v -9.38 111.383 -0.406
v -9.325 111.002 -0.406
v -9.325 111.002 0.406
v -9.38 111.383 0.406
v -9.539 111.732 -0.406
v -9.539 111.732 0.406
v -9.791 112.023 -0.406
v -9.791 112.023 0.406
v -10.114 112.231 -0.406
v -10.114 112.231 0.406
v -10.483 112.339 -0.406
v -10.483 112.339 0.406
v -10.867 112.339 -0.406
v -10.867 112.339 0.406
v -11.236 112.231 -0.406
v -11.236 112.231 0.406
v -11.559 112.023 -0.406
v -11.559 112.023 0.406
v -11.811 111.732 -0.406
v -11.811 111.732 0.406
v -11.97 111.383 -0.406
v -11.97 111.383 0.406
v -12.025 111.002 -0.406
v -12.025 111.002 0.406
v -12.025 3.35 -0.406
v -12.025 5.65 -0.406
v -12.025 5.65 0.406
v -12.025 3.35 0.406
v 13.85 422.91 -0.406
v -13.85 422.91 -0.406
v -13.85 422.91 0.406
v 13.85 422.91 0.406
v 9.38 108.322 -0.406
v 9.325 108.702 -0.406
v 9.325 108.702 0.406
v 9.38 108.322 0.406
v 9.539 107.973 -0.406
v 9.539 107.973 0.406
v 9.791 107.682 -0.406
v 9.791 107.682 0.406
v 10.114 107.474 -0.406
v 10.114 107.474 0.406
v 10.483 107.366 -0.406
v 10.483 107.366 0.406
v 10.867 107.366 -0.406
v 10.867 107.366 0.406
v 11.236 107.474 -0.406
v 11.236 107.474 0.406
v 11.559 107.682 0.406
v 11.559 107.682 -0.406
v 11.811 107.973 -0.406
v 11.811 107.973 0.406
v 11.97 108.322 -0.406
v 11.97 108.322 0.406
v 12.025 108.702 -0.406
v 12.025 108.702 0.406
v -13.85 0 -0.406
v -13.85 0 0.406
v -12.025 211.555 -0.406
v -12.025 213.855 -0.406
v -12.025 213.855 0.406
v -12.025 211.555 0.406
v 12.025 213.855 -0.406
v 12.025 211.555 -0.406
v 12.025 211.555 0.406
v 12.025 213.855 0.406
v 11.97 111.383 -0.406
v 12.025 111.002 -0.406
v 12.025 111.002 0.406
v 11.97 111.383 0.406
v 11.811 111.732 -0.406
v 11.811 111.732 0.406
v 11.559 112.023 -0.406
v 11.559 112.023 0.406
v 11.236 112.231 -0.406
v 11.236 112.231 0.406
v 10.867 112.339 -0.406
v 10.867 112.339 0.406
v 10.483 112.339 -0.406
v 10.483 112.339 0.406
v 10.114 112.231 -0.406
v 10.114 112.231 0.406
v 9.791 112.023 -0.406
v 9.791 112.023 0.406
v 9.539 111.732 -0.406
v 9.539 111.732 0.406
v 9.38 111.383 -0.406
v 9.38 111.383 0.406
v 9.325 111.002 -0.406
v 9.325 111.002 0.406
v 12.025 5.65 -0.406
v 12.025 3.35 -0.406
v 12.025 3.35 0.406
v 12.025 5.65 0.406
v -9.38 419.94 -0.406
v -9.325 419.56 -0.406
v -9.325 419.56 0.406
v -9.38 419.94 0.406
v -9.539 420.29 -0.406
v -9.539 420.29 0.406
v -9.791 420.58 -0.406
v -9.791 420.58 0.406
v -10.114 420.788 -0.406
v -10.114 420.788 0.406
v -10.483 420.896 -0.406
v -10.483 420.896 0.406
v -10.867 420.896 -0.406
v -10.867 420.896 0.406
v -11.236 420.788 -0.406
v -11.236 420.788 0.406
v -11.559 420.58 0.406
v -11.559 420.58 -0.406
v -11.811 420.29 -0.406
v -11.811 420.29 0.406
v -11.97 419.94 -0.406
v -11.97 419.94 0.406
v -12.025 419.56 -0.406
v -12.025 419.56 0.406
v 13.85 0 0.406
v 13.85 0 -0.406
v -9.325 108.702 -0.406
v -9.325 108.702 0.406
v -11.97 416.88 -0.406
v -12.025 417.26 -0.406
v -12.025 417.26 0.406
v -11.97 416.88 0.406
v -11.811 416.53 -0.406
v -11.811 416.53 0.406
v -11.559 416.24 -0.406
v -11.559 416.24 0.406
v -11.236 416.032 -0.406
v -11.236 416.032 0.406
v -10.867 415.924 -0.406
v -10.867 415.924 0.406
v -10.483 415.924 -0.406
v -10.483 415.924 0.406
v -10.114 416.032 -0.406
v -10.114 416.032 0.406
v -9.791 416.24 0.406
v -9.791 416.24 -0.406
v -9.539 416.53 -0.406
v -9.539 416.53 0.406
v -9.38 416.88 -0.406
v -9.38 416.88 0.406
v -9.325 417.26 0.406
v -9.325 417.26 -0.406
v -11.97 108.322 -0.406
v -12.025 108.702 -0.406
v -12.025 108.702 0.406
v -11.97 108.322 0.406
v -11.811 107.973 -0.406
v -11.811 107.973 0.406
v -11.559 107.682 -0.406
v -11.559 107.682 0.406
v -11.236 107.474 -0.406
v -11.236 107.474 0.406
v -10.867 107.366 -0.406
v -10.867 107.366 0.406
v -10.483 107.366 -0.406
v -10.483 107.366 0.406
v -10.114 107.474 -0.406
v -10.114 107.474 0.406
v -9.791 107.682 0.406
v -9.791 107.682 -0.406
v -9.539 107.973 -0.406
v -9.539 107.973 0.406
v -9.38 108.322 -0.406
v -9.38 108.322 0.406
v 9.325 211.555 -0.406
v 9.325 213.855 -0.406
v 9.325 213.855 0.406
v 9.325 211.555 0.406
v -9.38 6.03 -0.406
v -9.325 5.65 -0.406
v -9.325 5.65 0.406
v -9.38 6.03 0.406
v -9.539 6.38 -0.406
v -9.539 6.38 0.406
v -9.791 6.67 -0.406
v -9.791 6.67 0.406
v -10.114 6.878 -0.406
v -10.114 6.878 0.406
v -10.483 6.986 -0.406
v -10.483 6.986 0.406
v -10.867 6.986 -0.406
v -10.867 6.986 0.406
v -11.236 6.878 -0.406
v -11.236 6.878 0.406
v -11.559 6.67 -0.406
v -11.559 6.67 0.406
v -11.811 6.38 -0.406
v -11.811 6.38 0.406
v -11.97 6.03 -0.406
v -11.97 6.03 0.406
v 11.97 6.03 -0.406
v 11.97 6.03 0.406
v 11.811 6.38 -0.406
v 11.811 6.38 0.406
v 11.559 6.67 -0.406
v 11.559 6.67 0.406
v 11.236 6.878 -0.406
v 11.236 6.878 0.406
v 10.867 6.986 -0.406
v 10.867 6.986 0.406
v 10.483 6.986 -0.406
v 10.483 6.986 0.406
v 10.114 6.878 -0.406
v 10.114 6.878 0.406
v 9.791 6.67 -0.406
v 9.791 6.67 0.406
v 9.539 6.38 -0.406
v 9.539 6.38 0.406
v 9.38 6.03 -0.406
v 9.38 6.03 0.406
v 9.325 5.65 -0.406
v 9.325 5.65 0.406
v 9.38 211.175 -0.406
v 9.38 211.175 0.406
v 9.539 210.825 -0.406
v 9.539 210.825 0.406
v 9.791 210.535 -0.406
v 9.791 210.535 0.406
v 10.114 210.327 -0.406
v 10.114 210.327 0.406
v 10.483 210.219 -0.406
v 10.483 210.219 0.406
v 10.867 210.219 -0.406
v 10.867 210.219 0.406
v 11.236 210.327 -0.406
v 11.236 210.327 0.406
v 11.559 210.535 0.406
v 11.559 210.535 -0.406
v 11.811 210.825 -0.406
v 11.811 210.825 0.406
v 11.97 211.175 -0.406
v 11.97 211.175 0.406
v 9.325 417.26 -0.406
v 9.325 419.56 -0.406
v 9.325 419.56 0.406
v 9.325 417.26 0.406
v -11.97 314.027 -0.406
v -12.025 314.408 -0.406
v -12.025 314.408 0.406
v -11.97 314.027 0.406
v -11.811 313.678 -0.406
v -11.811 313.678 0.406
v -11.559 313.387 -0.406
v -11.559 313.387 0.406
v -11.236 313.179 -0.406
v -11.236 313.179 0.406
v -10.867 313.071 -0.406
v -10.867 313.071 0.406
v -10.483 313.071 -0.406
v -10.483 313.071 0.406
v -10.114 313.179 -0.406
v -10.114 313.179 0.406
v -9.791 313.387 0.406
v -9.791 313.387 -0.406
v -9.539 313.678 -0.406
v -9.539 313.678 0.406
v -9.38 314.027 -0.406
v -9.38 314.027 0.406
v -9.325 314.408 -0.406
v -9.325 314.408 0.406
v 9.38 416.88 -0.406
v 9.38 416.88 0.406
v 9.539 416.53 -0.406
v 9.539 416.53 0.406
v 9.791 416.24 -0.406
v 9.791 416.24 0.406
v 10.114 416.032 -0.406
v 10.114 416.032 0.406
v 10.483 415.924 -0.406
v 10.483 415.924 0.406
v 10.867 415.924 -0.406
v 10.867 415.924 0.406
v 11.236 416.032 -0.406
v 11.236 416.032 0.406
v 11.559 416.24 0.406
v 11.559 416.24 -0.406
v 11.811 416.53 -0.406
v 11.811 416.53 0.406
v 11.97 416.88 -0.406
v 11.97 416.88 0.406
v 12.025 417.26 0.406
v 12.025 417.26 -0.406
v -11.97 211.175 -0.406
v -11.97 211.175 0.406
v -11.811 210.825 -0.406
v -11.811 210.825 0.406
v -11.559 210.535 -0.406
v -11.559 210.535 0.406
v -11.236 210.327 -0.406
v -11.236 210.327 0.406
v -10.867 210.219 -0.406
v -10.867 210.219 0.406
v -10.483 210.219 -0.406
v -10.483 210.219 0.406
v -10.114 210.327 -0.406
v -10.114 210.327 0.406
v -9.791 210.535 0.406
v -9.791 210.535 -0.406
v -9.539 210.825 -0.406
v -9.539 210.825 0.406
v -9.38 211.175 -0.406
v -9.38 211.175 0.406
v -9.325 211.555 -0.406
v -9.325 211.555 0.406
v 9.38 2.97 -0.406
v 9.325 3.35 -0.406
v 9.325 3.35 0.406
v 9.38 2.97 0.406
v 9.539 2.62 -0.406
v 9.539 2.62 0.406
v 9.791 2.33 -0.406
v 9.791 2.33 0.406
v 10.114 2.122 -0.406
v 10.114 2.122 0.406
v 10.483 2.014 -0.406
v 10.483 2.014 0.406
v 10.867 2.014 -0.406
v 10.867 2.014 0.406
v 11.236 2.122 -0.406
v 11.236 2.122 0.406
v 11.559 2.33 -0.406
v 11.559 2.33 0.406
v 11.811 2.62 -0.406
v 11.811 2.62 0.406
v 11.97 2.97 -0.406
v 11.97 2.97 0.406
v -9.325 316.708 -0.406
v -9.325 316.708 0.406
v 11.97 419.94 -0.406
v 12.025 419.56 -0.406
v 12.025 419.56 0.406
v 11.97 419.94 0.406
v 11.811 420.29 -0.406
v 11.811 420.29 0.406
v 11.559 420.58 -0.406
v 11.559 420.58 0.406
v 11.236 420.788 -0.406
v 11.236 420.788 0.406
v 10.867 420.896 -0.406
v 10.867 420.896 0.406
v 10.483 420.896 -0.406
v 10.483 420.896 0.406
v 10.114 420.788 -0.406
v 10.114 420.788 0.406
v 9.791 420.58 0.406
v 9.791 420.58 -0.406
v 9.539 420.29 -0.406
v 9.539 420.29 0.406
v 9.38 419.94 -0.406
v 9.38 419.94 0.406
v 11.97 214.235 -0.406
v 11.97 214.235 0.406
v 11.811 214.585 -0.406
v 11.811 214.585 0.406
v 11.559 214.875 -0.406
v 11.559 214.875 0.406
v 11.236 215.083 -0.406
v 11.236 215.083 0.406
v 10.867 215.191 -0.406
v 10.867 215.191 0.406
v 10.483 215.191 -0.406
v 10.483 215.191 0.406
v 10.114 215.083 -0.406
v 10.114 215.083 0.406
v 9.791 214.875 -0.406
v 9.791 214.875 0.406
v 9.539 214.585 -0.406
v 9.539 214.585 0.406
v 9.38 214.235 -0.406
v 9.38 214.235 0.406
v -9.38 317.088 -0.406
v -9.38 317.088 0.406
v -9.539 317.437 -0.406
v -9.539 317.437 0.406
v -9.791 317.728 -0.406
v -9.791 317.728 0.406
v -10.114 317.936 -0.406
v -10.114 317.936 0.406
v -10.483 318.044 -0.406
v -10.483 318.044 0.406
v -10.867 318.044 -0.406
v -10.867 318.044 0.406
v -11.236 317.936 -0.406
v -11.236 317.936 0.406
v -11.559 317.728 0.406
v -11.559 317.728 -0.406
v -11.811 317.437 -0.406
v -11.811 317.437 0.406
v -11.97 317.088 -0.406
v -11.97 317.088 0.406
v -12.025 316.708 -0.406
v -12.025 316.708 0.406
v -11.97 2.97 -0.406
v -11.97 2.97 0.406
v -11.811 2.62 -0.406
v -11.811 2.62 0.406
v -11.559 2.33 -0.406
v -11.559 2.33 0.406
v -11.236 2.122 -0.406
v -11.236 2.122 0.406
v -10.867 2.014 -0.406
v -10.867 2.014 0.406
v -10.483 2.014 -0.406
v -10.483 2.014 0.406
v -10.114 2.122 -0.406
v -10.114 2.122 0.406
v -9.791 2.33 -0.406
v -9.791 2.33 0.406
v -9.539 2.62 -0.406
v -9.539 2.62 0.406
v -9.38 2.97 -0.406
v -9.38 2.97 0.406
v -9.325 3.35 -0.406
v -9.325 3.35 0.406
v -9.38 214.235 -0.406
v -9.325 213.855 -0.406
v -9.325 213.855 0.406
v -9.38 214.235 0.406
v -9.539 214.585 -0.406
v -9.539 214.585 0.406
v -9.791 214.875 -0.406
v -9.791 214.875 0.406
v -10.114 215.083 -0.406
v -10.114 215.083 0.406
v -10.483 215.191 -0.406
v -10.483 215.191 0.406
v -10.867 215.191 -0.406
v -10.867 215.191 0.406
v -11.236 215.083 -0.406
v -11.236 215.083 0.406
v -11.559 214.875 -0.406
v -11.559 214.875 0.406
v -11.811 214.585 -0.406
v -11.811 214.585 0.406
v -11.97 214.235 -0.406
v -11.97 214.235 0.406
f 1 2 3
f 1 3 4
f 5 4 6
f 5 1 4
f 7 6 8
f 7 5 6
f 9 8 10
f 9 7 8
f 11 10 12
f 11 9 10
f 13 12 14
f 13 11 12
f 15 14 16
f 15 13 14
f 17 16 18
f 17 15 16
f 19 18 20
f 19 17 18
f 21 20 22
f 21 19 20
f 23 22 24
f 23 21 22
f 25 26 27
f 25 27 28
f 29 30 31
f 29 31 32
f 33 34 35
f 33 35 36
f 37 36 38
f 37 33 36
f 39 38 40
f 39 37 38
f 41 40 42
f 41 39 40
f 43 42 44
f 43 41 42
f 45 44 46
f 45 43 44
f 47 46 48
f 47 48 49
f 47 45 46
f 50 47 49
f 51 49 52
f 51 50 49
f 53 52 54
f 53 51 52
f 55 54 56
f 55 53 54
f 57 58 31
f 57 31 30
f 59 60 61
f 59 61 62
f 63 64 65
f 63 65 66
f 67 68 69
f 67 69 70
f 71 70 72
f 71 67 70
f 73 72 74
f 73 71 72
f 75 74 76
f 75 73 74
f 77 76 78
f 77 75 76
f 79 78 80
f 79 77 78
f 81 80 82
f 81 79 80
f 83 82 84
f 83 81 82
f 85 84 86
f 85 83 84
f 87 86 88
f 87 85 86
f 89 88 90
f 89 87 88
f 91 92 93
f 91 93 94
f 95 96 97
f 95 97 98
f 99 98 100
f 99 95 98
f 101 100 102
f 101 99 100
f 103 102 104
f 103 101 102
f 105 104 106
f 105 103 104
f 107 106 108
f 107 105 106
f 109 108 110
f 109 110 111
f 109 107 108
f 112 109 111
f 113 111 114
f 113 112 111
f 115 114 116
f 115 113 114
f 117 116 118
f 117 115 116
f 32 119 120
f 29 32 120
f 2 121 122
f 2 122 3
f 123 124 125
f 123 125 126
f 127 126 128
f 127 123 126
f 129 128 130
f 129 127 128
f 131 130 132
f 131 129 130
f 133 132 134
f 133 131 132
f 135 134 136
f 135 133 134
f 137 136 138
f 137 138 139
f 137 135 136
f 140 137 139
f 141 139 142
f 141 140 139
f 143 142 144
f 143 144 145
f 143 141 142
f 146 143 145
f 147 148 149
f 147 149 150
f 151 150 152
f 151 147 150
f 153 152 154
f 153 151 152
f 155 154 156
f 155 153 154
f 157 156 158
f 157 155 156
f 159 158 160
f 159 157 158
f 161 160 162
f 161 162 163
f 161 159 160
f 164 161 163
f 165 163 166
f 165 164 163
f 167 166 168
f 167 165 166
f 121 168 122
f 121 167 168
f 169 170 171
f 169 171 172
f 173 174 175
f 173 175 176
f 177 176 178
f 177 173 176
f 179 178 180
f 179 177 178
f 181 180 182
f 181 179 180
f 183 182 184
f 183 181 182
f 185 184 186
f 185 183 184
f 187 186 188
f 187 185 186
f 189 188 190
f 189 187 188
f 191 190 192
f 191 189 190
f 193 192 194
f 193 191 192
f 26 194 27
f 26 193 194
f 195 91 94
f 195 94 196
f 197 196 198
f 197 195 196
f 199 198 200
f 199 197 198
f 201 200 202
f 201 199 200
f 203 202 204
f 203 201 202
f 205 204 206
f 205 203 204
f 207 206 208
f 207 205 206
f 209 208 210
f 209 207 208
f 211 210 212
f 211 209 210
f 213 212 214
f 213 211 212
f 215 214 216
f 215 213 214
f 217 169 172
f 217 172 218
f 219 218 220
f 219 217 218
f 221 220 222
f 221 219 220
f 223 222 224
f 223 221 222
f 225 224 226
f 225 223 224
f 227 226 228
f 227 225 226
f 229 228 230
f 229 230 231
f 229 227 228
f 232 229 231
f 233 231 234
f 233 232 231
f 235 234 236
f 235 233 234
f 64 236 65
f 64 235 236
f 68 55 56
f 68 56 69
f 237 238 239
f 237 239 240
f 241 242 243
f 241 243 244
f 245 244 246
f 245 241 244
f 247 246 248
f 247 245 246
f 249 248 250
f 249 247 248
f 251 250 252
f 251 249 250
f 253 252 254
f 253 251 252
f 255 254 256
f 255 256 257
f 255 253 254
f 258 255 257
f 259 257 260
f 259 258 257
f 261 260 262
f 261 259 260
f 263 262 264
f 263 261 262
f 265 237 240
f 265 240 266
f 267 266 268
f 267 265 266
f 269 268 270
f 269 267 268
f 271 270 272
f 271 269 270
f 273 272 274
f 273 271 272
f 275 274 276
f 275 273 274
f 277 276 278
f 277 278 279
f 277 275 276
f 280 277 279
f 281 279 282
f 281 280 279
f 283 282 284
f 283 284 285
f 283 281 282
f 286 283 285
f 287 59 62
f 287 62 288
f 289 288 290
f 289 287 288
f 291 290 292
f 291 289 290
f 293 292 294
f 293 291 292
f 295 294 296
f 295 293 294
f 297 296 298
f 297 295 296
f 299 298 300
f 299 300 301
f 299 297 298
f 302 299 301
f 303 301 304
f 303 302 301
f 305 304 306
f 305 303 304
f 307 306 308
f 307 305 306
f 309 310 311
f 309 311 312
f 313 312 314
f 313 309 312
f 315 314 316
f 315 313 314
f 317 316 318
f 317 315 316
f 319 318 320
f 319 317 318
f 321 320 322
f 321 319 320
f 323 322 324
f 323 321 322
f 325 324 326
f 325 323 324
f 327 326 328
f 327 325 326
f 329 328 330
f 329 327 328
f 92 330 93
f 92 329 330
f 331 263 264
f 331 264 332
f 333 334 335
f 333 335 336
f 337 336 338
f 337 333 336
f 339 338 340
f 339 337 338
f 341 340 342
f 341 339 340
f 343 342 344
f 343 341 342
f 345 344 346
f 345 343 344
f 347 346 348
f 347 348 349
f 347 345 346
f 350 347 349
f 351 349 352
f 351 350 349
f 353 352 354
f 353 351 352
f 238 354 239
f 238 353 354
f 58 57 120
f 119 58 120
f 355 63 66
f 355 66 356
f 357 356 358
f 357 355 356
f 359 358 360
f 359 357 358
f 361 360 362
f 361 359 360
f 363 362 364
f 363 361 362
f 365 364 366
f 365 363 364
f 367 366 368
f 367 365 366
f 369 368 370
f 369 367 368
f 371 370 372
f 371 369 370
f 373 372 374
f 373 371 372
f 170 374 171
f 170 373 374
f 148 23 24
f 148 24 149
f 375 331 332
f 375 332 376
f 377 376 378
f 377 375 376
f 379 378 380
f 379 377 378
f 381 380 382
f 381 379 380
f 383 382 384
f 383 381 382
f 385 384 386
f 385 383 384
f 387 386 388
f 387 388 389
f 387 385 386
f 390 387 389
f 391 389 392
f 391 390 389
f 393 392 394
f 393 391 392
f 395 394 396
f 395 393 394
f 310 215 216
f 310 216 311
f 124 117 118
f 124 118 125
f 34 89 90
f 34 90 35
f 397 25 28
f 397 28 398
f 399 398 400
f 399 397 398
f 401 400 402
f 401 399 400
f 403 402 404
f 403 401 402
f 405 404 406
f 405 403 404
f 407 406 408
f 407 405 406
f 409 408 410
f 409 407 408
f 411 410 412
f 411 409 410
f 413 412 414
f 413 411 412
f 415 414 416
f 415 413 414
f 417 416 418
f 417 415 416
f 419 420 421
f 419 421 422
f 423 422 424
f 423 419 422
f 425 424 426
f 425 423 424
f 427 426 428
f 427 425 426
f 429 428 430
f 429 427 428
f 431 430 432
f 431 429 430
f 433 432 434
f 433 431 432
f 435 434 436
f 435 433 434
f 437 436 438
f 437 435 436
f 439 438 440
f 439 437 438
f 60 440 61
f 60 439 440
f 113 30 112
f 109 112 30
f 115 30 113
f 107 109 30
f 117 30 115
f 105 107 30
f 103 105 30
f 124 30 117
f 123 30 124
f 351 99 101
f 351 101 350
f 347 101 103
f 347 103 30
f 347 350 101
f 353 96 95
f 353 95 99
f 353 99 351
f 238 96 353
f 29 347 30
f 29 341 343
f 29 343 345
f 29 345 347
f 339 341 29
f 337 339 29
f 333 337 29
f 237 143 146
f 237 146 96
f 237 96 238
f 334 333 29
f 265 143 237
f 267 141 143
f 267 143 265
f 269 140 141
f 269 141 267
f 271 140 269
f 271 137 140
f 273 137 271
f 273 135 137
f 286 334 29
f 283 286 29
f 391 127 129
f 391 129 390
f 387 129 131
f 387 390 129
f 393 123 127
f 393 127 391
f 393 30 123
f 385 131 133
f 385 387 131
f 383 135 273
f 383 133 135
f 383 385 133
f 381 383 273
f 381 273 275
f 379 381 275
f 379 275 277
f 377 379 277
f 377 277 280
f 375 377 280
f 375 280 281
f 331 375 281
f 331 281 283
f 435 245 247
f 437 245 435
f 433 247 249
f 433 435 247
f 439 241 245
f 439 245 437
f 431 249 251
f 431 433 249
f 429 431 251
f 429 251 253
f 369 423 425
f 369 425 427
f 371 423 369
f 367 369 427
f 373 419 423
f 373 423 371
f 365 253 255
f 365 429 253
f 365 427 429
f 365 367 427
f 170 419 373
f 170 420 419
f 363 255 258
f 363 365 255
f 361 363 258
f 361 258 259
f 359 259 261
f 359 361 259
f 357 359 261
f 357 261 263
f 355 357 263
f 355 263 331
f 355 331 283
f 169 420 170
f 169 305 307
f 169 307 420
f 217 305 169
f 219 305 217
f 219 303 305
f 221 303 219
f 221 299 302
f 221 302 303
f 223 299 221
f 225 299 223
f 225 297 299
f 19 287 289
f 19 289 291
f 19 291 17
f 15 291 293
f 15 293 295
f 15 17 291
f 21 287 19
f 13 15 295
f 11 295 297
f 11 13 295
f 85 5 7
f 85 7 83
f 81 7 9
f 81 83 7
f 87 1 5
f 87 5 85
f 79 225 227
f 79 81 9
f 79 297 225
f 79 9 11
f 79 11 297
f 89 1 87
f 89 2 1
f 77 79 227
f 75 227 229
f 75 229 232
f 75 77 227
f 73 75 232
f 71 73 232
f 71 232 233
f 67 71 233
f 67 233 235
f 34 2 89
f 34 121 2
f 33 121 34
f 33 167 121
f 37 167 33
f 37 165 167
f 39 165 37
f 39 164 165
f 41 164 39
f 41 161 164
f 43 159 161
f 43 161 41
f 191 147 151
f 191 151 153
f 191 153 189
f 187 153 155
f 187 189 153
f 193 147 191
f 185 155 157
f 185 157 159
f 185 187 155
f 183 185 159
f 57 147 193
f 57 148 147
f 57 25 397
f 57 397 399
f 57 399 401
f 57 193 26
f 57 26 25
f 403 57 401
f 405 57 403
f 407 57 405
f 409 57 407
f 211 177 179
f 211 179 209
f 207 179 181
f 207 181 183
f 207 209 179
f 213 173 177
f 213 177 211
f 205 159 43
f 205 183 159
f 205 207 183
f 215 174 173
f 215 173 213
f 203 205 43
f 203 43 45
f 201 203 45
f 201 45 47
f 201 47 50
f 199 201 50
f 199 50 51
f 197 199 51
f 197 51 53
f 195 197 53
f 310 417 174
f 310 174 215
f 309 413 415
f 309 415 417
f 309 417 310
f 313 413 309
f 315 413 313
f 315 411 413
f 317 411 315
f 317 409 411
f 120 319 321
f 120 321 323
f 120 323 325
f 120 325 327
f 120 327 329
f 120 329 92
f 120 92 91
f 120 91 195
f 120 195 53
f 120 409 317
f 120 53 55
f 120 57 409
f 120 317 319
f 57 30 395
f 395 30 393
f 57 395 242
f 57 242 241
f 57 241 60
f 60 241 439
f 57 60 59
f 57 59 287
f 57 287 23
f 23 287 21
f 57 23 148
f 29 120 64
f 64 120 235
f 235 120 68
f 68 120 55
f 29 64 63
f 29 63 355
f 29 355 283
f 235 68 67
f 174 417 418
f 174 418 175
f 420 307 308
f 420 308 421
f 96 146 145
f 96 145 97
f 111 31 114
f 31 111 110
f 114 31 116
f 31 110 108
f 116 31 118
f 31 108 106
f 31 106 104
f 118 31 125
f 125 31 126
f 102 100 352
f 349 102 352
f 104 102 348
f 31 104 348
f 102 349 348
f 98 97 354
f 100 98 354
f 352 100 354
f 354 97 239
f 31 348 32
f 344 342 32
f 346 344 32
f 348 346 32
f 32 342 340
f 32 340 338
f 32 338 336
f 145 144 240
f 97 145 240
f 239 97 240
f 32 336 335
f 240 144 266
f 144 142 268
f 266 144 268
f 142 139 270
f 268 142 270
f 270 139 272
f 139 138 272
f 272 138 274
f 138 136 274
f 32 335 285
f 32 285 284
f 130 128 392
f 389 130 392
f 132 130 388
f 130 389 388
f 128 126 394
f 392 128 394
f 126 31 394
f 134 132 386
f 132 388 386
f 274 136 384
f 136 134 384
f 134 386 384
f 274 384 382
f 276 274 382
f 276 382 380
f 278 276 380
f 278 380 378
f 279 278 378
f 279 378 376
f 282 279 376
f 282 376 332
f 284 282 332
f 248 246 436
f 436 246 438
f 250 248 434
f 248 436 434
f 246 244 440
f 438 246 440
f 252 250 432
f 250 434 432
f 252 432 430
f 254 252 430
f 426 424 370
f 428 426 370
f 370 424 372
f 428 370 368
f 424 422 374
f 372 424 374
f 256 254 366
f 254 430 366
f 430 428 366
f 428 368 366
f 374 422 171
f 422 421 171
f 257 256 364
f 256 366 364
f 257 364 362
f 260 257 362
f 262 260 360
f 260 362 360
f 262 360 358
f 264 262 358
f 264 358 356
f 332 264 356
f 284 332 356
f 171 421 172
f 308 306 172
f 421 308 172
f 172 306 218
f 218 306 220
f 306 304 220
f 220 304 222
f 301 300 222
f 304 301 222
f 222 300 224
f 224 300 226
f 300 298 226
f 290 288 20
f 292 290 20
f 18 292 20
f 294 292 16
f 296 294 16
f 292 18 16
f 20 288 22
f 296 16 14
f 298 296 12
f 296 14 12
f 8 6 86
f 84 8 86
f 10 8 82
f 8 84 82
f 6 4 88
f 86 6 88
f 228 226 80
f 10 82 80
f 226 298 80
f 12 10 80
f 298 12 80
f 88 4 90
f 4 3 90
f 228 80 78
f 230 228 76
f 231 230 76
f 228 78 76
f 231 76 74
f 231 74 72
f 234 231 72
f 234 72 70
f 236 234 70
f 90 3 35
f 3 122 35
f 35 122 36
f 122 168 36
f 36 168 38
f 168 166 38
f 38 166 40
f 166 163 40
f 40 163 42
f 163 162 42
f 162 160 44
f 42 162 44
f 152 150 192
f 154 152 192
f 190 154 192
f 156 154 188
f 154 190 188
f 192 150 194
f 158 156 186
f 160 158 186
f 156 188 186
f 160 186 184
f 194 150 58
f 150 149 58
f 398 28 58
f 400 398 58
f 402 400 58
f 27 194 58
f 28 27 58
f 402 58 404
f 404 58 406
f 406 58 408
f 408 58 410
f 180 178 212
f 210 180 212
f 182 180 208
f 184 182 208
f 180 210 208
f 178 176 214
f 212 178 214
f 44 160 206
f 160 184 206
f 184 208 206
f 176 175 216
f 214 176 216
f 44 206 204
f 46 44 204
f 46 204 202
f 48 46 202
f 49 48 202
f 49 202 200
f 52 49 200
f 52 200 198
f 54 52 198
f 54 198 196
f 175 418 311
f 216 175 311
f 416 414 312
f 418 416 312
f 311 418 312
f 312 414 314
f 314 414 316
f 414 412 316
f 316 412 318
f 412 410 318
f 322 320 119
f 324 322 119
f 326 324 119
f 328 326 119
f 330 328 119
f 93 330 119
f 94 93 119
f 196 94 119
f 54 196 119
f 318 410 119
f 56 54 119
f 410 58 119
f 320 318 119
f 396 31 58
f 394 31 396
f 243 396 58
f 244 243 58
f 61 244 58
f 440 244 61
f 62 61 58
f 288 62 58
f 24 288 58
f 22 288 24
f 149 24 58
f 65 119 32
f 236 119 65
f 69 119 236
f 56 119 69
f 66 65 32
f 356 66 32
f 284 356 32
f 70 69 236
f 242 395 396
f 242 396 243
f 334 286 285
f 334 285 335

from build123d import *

# Parameters (mm, degrees)
SKETCH1_W                  = 27.7
SKETCH1_H                  = 0.8128
BOSS_EXTRUDE1_DEPTH        = 422.91
M2_5_START                 = -0.4064
M2_5_CLEARANCE_SLOT2_DEPTH = 0.8128


# Read off the part's stored shape, not the designer's step: M2.5 Clearance Slot2
with BuildPart() as part:
    # Sketch1 → Boss-Extrude1 (new body)
    with BuildSketch(Plane(origin=(0, 0, 0), x_dir=(1, 0, 0), z_dir=(0, 1, 0))):
        Rectangle(SKETCH1_W, SKETCH1_H)
    extrude(amount=BOSS_EXTRUDE1_DEPTH)

    # M2.5 Clearance Slot2 outline → M2.5 Clearance Slot2 (cut)
    with BuildSketch(Plane.XY.offset(M2_5_START)):
        with BuildLine():
            ThreePointArc((-9.325, 111.0025), (-10.675, 112.3525), (-12.025, 111.0025))
            Line((-12.025, 111.0025), (-12.025, 108.7025))
            ThreePointArc((-12.025, 108.7025), (-10.675, 107.3525), (-9.325, 108.7025))
            Line((-9.325, 108.7025), (-9.325, 111.0025))
        make_face()
        with BuildLine():
            Line((-9.325, 211.555), (-9.325, 213.855))
            ThreePointArc((-9.325, 213.855), (-10.675, 215.205), (-12.025, 213.855))
            Line((-12.025, 213.855), (-12.025, 211.555))
            ThreePointArc((-12.025, 211.555), (-10.675, 210.205), (-9.325, 211.555))
        make_face()
        with BuildLine():
            Line((-9.325, 314.4075), (-9.325, 316.7075))
            ThreePointArc((-9.325, 316.7075), (-10.675, 318.0575), (-12.025, 316.7075))
            Line((-12.025, 316.7075), (-12.025, 314.4075))
            ThreePointArc((-12.025, 314.4075), (-10.675, 313.0575), (-9.325, 314.4075))
        make_face()
        with BuildLine():
            Line((-9.325, 417.26), (-9.325, 419.56))
            ThreePointArc((-9.325, 419.56), (-10.675, 420.91), (-12.025, 419.56))
            Line((-12.025, 419.56), (-12.025, 417.26))
            ThreePointArc((-12.025, 417.26), (-10.675, 415.91), (-9.325, 417.26))
        make_face()
        with BuildLine():
            Line((-9.325, 3.35), (-9.325, 5.65))
            ThreePointArc((-9.325, 5.65), (-10.675, 7), (-12.025, 5.65))
            Line((-12.025, 5.65), (-12.025, 3.35))
            ThreePointArc((-12.025, 3.35), (-10.675, 2), (-9.325, 3.35))
        make_face()
        with BuildLine():
            ThreePointArc((12.025, 111.0025), (10.675, 112.3525), (9.325, 111.0025))
            Line((9.325, 111.0025), (9.325, 108.7025))
            ThreePointArc((9.325, 108.7025), (10.675, 107.3525), (12.025, 108.7025))
            Line((12.025, 108.7025), (12.025, 111.0025))
        make_face()
        with BuildLine():
            Line((12.025, 211.555), (12.025, 213.855))
            ThreePointArc((12.025, 213.855), (10.675, 215.205), (9.325, 213.855))
            Line((9.325, 213.855), (9.325, 211.555))
            ThreePointArc((9.325, 211.555), (10.675, 210.205), (12.025, 211.555))
        make_face()
        with BuildLine():
            Line((12.025, 417.26), (12.025, 419.56))
            ThreePointArc((12.025, 419.56), (10.675, 420.91), (9.325, 419.56))
            Line((9.325, 419.56), (9.325, 417.26))
            ThreePointArc((9.325, 417.26), (10.675, 415.91), (12.025, 417.26))
        make_face()
        with BuildLine():
            Line((12.025, 3.35), (12.025, 5.65))
            ThreePointArc((12.025, 5.65), (10.675, 7), (9.325, 5.65))
            Line((9.325, 5.65), (9.325, 3.35))
            ThreePointArc((9.325, 3.35), (10.675, 2), (12.025, 3.35))
        make_face()
    extrude(amount=M2_5_CLEARANCE_SLOT2_DEPTH, mode=Mode.SUBTRACT)


solid = part.part
